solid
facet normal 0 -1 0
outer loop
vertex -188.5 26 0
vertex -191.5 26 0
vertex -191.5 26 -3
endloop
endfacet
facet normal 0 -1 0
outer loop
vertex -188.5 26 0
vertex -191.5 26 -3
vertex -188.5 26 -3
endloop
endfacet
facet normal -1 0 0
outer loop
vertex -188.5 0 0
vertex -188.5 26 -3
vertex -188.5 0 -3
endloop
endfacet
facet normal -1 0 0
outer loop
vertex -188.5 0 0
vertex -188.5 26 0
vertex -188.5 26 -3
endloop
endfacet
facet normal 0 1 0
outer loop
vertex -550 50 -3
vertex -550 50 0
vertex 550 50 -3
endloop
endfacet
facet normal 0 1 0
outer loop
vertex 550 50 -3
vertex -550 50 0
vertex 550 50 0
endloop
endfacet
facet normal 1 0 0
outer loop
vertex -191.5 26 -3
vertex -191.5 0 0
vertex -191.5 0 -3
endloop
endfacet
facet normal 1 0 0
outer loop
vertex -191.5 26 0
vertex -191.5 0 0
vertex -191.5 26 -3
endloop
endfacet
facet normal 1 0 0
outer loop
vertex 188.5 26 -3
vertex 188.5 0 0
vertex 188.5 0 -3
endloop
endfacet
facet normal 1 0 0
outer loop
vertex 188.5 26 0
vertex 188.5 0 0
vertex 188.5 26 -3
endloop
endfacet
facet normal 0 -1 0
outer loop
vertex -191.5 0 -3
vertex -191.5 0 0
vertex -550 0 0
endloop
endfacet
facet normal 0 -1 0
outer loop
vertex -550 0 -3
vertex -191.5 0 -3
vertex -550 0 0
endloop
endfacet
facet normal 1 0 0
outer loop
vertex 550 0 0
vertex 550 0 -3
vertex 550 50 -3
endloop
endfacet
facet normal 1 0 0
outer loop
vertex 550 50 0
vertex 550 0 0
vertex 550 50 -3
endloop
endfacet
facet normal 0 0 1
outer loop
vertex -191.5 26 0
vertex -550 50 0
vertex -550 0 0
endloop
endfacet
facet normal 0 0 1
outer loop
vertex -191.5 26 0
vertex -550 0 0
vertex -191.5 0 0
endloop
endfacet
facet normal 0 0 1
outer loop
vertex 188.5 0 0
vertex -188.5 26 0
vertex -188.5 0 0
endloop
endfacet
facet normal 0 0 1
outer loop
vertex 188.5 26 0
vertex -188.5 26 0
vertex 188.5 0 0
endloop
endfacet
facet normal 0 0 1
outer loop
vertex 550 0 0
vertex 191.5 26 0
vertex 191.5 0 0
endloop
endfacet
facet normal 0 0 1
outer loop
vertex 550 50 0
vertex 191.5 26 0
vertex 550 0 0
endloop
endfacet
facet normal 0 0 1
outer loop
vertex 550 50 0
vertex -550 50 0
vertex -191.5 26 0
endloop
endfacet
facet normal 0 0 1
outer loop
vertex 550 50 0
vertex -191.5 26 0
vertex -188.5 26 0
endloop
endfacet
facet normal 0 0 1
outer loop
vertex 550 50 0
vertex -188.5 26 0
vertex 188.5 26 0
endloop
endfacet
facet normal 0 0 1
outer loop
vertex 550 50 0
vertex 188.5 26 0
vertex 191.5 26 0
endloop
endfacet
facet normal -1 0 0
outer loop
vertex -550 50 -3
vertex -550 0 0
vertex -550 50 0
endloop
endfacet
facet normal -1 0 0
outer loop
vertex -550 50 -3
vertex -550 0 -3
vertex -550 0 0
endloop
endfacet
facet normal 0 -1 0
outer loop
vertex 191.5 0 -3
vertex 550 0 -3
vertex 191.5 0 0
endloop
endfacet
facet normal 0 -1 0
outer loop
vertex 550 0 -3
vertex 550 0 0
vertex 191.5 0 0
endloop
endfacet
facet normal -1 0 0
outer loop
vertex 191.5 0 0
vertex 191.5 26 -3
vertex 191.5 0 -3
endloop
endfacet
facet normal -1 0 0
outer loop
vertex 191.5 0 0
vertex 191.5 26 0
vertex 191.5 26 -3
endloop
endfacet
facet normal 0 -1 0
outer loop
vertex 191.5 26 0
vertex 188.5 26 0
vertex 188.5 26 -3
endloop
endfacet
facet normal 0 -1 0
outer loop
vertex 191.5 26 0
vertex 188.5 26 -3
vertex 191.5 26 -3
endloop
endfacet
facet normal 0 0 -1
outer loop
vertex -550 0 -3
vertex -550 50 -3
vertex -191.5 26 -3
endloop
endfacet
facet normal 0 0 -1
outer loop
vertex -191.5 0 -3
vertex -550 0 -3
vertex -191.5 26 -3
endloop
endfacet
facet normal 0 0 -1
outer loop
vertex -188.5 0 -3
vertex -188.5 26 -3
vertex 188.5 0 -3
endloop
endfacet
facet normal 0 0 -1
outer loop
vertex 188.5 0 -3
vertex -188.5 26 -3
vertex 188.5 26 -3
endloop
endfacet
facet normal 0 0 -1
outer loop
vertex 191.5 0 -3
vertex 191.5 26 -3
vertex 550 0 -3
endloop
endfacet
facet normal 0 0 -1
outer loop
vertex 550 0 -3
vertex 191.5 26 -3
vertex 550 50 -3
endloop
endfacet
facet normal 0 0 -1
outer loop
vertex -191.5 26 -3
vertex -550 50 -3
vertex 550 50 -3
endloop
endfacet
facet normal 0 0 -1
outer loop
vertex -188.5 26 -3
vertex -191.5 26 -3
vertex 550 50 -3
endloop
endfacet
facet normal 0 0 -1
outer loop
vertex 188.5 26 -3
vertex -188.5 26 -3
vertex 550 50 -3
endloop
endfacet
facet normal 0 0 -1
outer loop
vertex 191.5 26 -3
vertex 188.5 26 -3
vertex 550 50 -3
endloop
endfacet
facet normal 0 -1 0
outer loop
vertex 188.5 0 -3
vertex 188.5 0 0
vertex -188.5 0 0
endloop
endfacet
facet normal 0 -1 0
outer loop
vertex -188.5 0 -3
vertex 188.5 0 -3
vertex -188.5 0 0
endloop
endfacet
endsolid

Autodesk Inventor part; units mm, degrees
ref_plane "YZ Plane" through (0, 0, 0) normal (1, 0, 0) x (0, 1, 0)
ref_plane "XZ Plane" through (0, 0, 0) normal (0, 1, 0) x (-1, 0, 0)
ref_plane "XY Plane" through (0, 0, 0) normal (0, 0, 1) x (1, 0, 0)
sketch "Sketch1" plane through (0, 0, 0) normal (0, 0, 1) x (1, 0, 0)
  line L0 (-600, 50) -> (600, 50)
  line L1 (600, 50) -> (600, 0)
  line L2 (600, 0) -> (-600, 0)
  line L3 (-600, 0) -> (-600, 50)
  circle A0 centre (-600, 0) radius 25
  circle A1 centre (600, 0) radius 25
  line L4 (600, 0) -> (657.2042, 48)
  line L5 (657.2042, 48) -> (657.2042, 50)
  line L6 (657.2042, 50) -> (600, 50)
  point P0 (0, 0)
  point P1 (0, 0)
  point P2 (-600, 25)
  point P3 (-575, 0)
  point P4 (575, 0)
  point P5 (600, 25)
  point P6 (619.1511, 16.0697)
  dimension "d16" = 50
  dimension "d17" = 1200
  dimension "d18" = 50
  dimension "d19" = 50
  dimension "d32" = 2
  dimension "d33" = 50
extrude "Plate2" add sketch "Sketch1" against normal blind 3 contours L0 L1 A1 L2 A0 L3 | A0 L2 L3 | L1 L2 A1 picked at (-598.1457, 16.4577)
sketch "Sketch2" plane through (0, 0, 0) normal (0, 0, 1) x (1, 0, 0)
  line L0 (-600, 0) -> (600, 0) projected
  line L1 (190, 0) -> (190, 50) construction
  line L2 (600, 50) -> (-600, 50) projected
  line L3 (188.5, 26) -> (191.5, 26)
  line L4 (191.5, 26) -> (191.5, 0)
  line L5 (191.5, 0) -> (188.5, 0)
  line L6 (188.5, 0) -> (188.5, 26)
  line L7 (-190, 50) -> (-190, 0) construction
  line L8 (-191.5, 26) -> (-188.5, 26)
  line L9 (-188.5, 26) -> (-188.5, 0)
  line L10 (-188.5, 0) -> (-191.5, 0)
  line L11 (-191.5, 0) -> (-191.5, 26)
  point P0 (0, 0)
  point P1 (0, 0)
  point P2 (188.5, 0)
  point P3 (0, 0)
  point P4 (-191.5, 0)
  point P5 (-188.5, 0)
  dimension "d21" = 190
  dimension "d22" = 3
  dimension "d23" = 26
  dimension "d29" = 190
  dimension "d30" = 3
  dimension "d31" = 26
extrude "Extrusion1" cut sketch "Sketch2" against normal through all
sketch "Sketch3" plane through (0, 0, -3) normal (0, 0, -1) x (-1, 0, 0)
  line L0 (-191.5, 0) -> (-191.5, 26) projected
  line L1 (-191.5, 26) -> (-188.5, 26) projected
  line L2 (-188.5, 26) -> (-188.5, 0) projected
  line L3 (188.5, 0) -> (-188.5, 0) projected
  line L4 (188.5, 0) -> (188.5, 26) projected
  line L5 (188.5, 26) -> (191.5, 26) projected
  line L6 (191.5, 26) -> (191.5, 0) projected
  line L7 (600, 0) -> (191.5, 0) projected
  line L8 (600, 50) -> (600, 0) projected
  line L9 (-600, 50) -> (600, 50) projected
  line L10 (-600, 0) -> (-600, 50) projected
  line L11 (-191.5, 0) -> (-600, 0) projected
  line L12 (600, 0) -> (191.5, 0) projected
  line L13 (550, 0) -> (550, 50)
  line L14 (-550, 0) -> (-550, 50)
  point P0 (0, 0)
  dimension "d34" = 50
  dimension "d35" = 50
extrude "Extrusion2" cut sketch "Sketch3" against normal through all contours L11 L10 L9 L14 | L9 L8 L7 L13
sketch "Sketch4" plane through (0, 0, 0) normal (0, 0, 1) x (1, 0, 0)
  line L0 (-62.2268, 17.4688) -> (-62.2268, 36.055) construction
  line L1 (-62.2268, 36.055) -> (59.8015, 36.055) construction
  line L2 (59.8015, 36.055) -> (59.8015, 17.4688) construction
  line L3 (59.8015, 17.4688) -> (-62.2268, 17.4688) construction
  point P0 (0, 0)
mark "Mark1"
equation "\"d22\" = Thickness"
equation "\"d29\" = d21"
equation "\"d30\" = Thickness"
equation "\"d31\" = d23"
equation "\"d35\" = d34"
equation "\"d20\" = Thickness"
equation "\"BendReliefWidth\" = Thickness"
equation "\"BendReliefDepth\" = 0.5 * Thickness"
equation "\"CornerReliefSize\" = 4 * Thickness"
equation "\"MinimumRemnant\" = 2 * Thickness"
equation "\"TransitionRadius\" = BendRadius"
equation "\"JacobiRadiusSize\" = BendRadius"
equation "\"GapSize\" = Thickness"
equation "\"Thickness\" = 3"
equation "\"BendRadius\" = 5"
properties part number "MSC 108 rib cone" material "Stainless Steel"
